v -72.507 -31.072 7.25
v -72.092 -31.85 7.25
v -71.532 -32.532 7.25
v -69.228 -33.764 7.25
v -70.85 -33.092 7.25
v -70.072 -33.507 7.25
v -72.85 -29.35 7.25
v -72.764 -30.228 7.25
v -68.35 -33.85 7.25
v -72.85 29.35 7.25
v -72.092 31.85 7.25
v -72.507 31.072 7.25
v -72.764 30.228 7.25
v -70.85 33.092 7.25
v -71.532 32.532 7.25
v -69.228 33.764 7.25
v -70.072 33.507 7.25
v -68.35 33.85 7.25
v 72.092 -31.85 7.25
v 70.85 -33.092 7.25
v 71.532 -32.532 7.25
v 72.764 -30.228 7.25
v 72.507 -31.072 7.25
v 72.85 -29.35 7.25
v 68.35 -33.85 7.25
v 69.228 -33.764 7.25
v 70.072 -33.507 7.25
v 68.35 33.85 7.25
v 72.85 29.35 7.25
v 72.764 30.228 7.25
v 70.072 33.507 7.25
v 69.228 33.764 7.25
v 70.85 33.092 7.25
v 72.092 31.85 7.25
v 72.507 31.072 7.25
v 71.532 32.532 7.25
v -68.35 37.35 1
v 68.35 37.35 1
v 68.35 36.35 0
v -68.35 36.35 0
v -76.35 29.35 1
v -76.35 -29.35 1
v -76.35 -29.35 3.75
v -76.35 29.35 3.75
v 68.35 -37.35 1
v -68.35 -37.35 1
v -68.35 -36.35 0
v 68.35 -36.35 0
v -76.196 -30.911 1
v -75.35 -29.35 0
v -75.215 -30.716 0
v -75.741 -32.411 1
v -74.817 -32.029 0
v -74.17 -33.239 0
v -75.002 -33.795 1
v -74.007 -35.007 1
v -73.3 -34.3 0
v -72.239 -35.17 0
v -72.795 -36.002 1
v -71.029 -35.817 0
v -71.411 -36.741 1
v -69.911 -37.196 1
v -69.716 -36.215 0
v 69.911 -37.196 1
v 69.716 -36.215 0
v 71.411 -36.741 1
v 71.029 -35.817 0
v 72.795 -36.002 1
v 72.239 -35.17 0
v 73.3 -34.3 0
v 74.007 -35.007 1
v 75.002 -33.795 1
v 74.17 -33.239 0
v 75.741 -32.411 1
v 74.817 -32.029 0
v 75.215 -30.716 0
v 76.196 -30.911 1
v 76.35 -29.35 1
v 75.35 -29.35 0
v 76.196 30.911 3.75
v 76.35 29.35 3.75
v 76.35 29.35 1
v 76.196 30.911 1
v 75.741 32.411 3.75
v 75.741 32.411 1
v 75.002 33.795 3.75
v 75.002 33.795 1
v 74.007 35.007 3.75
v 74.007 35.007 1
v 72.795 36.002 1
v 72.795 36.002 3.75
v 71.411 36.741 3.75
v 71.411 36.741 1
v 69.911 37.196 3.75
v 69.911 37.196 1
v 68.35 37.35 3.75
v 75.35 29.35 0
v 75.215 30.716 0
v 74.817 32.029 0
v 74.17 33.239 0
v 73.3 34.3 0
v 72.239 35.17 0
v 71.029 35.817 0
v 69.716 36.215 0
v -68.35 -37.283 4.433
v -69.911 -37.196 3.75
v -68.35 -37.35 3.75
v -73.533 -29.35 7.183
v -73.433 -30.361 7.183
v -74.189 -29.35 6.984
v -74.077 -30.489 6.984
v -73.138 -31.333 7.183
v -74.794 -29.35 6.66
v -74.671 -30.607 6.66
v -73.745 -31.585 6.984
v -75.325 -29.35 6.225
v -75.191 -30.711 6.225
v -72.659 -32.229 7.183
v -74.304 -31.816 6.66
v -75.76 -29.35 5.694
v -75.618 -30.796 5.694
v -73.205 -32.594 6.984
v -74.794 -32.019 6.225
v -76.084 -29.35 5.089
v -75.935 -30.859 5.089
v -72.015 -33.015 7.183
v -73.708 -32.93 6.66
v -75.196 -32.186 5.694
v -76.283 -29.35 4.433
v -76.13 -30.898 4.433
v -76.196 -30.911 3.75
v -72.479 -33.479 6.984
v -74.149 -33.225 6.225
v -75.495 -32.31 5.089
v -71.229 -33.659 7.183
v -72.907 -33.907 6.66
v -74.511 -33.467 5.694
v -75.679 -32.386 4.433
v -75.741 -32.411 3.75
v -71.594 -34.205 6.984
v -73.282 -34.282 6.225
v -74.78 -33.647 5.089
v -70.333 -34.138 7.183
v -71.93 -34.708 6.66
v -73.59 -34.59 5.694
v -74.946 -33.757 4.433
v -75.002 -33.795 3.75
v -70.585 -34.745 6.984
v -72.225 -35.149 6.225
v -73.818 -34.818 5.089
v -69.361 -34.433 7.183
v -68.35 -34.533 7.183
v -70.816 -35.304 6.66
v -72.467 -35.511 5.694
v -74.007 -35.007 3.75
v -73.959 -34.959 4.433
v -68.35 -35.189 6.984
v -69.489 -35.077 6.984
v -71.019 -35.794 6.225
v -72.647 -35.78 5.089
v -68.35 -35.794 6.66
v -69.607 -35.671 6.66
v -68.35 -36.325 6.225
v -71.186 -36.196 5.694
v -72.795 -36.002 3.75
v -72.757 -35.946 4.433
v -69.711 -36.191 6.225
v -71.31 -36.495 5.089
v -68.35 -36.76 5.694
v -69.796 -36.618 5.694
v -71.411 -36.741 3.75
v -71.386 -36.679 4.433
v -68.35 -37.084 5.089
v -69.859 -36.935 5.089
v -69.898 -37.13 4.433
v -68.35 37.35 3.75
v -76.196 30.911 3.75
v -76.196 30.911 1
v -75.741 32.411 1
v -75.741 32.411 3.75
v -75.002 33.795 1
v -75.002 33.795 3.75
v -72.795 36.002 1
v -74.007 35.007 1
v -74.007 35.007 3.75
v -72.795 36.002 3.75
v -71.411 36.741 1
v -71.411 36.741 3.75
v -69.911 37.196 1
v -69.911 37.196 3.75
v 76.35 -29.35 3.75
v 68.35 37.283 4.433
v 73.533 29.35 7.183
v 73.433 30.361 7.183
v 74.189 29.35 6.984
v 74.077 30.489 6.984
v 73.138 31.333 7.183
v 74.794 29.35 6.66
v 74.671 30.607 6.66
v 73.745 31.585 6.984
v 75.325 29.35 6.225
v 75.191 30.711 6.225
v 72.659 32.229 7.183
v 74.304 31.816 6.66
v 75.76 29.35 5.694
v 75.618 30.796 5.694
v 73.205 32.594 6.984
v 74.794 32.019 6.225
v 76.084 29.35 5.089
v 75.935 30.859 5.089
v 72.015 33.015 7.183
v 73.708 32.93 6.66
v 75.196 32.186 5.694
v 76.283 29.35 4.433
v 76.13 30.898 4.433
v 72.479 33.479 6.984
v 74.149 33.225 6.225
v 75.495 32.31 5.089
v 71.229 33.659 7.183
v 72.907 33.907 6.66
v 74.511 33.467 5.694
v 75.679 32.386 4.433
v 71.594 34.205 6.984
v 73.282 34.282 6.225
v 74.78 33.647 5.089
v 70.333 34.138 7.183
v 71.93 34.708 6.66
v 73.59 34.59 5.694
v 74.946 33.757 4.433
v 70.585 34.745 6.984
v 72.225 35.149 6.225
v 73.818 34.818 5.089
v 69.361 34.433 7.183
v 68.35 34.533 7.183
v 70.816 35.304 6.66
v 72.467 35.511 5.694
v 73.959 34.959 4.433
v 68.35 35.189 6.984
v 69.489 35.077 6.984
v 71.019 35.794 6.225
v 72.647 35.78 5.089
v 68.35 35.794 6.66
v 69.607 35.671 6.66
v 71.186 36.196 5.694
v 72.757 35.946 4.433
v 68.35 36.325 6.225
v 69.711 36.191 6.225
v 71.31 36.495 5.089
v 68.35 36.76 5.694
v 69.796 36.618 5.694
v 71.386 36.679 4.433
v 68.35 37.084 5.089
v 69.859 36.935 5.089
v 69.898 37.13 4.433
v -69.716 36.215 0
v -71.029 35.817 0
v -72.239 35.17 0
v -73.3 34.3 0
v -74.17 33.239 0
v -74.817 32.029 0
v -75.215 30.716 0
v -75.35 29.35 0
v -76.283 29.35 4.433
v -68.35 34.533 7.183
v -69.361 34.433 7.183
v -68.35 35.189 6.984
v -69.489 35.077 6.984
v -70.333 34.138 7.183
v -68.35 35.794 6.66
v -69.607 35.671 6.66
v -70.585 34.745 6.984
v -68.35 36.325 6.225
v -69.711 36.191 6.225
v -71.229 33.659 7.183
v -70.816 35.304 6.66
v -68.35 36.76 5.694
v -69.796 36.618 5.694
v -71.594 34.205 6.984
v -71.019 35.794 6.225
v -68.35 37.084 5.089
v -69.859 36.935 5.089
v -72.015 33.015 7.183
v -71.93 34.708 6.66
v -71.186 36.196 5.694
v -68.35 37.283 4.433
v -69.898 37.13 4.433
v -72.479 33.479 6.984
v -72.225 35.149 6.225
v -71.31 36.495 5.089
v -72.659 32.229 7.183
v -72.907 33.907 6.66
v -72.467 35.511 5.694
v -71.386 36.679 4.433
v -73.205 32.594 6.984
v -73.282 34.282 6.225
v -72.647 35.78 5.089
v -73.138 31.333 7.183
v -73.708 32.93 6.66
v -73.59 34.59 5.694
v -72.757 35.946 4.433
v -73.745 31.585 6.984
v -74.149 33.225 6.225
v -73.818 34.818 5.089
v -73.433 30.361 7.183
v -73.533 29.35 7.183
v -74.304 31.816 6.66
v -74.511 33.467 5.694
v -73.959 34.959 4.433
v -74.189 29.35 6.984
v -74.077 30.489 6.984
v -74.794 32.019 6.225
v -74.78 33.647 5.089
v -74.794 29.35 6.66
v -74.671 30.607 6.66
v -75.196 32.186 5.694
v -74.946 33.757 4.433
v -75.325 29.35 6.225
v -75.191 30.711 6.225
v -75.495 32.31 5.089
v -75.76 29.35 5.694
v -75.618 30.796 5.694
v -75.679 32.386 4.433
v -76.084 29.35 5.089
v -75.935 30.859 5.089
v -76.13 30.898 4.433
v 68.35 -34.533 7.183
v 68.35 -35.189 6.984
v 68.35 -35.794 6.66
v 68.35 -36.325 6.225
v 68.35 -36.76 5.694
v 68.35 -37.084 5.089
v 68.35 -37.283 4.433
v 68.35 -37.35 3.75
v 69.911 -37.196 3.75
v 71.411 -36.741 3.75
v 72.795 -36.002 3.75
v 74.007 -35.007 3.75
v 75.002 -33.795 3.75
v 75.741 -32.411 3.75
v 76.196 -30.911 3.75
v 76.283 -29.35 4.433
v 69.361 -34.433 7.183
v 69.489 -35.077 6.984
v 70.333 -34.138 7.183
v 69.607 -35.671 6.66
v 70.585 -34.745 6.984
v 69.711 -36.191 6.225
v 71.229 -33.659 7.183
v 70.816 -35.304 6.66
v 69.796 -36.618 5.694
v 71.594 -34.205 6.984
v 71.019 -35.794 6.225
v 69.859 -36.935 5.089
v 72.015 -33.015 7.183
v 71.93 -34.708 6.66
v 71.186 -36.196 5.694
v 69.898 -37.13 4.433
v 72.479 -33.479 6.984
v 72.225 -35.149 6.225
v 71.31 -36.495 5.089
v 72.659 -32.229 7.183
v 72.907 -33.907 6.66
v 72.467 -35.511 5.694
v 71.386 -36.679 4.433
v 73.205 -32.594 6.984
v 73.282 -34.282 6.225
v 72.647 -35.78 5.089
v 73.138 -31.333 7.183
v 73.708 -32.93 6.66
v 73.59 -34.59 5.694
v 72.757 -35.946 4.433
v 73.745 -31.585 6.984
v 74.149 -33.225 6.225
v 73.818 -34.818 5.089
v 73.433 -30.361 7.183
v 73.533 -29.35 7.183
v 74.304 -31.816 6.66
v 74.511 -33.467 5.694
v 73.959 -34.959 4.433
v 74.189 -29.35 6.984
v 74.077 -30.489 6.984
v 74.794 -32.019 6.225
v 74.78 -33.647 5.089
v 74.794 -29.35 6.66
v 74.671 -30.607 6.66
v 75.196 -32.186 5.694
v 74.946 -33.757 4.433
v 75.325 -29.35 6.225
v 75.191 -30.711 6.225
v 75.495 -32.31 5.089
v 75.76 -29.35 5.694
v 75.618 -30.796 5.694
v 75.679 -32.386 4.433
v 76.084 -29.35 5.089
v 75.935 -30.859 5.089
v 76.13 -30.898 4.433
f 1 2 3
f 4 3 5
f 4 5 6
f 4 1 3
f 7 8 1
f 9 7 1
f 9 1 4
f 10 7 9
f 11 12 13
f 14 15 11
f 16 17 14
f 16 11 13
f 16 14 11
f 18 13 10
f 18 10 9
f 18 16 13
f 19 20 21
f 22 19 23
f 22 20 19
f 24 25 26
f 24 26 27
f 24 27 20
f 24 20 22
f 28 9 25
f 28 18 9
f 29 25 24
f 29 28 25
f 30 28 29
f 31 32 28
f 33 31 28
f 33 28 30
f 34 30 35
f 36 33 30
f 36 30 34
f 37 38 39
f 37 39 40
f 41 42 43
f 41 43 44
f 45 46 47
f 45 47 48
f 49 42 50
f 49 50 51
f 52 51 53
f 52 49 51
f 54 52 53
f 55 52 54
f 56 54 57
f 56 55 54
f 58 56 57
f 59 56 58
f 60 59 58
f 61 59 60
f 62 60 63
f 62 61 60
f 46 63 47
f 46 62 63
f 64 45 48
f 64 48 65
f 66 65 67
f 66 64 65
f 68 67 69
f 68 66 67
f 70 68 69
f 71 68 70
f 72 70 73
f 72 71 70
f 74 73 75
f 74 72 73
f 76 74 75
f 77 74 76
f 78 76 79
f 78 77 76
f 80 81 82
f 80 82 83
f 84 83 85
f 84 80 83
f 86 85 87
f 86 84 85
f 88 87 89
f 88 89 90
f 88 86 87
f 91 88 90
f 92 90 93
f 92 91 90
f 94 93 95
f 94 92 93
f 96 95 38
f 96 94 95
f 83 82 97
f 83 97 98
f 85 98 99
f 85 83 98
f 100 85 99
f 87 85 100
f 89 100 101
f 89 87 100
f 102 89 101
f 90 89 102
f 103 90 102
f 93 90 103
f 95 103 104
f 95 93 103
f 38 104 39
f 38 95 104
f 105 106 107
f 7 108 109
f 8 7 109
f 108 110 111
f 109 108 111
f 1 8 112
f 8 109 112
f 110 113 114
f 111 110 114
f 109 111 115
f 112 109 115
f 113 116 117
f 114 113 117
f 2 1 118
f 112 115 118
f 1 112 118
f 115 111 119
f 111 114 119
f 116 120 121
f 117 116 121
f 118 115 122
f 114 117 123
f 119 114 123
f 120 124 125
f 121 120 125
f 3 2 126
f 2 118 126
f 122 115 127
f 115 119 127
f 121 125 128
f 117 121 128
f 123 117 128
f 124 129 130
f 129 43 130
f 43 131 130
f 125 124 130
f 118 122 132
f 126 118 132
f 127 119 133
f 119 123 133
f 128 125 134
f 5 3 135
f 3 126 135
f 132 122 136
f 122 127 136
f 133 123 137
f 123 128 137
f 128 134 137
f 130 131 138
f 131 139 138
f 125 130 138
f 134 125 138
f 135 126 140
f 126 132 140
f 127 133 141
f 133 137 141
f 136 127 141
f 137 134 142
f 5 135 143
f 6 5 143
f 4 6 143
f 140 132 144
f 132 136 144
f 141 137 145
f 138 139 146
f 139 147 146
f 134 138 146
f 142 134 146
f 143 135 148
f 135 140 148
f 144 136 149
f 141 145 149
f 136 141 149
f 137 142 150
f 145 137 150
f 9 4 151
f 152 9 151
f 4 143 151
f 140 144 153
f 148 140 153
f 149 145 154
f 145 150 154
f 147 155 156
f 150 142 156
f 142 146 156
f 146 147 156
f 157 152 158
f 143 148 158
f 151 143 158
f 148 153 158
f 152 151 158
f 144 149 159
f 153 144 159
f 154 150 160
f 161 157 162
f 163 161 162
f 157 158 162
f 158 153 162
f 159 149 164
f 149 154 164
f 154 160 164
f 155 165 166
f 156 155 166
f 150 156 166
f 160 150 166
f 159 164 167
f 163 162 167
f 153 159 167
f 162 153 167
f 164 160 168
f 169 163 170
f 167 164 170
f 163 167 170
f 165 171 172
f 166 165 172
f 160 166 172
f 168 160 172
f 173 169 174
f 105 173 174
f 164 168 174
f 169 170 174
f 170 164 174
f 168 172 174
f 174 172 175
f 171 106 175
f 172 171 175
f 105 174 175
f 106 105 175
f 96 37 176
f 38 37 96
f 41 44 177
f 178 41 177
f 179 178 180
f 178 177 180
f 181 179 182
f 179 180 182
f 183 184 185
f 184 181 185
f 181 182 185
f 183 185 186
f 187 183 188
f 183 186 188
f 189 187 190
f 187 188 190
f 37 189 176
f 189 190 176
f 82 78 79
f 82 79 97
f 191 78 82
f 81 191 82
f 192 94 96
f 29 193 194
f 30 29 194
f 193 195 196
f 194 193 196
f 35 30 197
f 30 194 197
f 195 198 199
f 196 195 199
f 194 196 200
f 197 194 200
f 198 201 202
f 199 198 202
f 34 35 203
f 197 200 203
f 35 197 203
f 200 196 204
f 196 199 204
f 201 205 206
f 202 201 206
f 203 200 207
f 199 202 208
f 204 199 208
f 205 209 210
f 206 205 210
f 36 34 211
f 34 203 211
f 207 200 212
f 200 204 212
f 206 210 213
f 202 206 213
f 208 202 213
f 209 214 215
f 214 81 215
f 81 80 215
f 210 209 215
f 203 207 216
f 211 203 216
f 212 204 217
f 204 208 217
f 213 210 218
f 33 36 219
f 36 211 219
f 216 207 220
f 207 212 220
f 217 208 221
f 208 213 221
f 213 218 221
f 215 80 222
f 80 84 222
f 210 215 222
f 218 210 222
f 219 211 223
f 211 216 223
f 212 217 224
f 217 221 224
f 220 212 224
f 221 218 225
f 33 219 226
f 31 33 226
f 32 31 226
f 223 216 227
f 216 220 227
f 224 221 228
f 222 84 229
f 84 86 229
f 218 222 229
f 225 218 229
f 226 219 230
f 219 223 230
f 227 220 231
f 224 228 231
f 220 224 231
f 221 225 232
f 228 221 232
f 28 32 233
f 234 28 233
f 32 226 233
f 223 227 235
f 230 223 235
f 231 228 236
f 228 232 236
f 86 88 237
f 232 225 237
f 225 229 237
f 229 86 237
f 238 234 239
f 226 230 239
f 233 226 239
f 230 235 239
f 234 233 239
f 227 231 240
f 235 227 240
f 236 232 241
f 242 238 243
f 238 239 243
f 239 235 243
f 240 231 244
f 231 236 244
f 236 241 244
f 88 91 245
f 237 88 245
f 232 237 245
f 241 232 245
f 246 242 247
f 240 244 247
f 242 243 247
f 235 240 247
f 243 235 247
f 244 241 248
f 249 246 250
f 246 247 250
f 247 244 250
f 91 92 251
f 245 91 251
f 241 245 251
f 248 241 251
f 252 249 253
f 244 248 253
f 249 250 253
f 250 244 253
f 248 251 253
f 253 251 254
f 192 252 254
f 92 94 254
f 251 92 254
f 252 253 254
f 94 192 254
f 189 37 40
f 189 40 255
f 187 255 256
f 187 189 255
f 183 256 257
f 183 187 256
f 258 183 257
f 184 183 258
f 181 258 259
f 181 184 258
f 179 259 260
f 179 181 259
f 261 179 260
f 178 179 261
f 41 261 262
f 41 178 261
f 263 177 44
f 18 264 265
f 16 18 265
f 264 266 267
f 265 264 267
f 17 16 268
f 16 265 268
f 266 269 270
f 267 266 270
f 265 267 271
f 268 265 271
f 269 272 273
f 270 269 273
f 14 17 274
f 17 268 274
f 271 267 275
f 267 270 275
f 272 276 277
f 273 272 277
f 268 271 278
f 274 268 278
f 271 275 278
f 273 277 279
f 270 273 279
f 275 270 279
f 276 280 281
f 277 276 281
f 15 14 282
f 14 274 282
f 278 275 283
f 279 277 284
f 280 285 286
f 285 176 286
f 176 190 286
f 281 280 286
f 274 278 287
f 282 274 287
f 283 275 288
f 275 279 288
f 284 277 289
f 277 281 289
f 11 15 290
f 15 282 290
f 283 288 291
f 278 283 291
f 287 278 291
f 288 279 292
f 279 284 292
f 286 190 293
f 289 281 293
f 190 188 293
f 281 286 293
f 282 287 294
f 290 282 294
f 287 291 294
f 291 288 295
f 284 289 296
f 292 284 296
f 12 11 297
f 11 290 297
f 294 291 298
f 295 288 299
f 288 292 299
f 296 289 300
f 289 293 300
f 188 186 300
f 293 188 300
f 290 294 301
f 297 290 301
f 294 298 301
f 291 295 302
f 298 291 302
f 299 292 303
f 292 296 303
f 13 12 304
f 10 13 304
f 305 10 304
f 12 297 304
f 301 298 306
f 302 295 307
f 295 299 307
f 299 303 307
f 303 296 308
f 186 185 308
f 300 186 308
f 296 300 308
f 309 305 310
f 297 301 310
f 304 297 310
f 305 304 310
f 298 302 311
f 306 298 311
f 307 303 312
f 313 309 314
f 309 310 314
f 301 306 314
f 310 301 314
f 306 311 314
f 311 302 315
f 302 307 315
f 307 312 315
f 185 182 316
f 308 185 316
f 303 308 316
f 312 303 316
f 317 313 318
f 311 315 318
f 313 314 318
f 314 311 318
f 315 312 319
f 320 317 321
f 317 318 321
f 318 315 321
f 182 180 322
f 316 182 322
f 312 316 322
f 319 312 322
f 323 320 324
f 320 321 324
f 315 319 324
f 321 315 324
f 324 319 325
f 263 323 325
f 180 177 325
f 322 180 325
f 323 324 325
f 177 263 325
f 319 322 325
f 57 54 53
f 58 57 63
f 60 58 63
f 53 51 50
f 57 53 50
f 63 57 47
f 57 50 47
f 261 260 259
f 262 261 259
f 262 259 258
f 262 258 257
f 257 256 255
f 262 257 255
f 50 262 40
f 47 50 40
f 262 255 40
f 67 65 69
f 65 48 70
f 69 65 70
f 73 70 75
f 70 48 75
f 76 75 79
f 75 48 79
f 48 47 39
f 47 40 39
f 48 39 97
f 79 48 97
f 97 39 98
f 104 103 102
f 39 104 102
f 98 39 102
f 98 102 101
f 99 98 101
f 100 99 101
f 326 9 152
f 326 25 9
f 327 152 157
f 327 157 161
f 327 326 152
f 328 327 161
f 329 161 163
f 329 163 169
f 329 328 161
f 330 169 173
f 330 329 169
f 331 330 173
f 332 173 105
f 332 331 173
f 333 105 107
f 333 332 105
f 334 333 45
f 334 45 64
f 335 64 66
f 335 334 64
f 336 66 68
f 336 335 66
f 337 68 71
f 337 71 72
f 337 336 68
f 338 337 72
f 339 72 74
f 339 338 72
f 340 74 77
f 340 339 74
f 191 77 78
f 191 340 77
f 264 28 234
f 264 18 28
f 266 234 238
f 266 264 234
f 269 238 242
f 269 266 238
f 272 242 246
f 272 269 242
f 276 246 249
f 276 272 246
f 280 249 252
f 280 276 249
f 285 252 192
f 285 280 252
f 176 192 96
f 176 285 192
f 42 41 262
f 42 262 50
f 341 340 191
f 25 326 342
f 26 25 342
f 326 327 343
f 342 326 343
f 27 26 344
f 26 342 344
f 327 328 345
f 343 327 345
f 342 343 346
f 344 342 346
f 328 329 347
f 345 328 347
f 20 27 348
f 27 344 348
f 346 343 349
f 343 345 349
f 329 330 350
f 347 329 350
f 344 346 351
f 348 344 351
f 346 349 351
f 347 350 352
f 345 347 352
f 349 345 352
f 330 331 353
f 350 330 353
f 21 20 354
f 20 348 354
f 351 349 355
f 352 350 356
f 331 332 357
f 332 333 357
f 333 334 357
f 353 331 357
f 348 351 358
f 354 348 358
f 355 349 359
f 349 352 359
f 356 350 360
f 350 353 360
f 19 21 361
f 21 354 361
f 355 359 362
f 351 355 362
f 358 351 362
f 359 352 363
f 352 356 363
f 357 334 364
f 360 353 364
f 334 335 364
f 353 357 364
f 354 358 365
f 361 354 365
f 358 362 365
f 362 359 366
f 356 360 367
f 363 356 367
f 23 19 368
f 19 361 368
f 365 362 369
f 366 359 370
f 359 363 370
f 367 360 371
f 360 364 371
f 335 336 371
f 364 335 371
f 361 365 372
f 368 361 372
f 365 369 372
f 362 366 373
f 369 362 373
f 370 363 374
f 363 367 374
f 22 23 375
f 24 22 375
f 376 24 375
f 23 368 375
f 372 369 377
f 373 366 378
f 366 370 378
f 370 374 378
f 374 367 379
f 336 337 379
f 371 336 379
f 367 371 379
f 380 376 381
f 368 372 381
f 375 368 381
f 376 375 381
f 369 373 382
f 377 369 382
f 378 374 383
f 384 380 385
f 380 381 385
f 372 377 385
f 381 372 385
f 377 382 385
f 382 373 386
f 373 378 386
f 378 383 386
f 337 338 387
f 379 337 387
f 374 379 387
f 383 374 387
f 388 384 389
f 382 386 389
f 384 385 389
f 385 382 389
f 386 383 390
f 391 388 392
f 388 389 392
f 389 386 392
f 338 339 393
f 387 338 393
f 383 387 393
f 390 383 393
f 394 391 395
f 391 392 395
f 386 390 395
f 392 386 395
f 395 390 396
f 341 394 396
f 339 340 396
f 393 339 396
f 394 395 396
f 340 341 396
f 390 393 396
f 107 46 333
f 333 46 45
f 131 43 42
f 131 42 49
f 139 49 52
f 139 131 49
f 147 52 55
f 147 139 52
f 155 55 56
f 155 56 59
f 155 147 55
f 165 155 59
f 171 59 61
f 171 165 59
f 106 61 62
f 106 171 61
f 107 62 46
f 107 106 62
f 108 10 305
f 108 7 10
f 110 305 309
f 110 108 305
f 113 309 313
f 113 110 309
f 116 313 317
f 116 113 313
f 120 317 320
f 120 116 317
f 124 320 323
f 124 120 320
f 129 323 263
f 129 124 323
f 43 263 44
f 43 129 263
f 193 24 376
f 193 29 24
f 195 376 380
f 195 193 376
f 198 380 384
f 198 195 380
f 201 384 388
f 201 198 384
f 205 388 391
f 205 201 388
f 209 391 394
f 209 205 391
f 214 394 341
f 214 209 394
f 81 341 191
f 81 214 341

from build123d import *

# Parameters (mm, degrees)
F0_W     = 152.7
F0_H     = 74.7
F1_DEPTH = 7.25
F2_R     = 8
F3_SIZE  = 1
F4_R     = 3.5


with BuildPart() as f1:
    # F0 (on Top) → F1 (new body)
    with BuildSketch(Plane.XY):
        Rectangle(F0_W, F0_H)
    extrude(amount=F1_DEPTH)

    # F2
    f2_edges = [f1.edges().sort_by_distance(p)[0] for p in [
        (-76.35, -37.35, 3.625),
        (76.35, -37.35, 3.625),
        (76.35, 37.35, 3.625),
        (-76.35, 37.35, 3.625),
    ]]
    fillet(f2_edges, radius=F2_R)

    # F3
    f3_edges = [f1.edges().sort_by_distance(p)[0] for p in [
        (0, -37.35, 0),
        (74.006854, -35.006854, 0),
        (76.35, 0, 0),
        (74.006854, 35.006854, 0),
        (-74.006854, -35.006854, 0),
        (-76.35, 0, 0),
        (-74.006854, 35.006854, 0),
        (0, 37.35, 0),
    ]]
    chamfer(f3_edges, length=F3_SIZE)

    # F4
    f4_edges = [f1.edges().sort_by_distance(p)[0] for p in [
        (0, -37.35, 7.25),
    ]]
    fillet(f4_edges, radius=F4_R)


solid = f1.part
